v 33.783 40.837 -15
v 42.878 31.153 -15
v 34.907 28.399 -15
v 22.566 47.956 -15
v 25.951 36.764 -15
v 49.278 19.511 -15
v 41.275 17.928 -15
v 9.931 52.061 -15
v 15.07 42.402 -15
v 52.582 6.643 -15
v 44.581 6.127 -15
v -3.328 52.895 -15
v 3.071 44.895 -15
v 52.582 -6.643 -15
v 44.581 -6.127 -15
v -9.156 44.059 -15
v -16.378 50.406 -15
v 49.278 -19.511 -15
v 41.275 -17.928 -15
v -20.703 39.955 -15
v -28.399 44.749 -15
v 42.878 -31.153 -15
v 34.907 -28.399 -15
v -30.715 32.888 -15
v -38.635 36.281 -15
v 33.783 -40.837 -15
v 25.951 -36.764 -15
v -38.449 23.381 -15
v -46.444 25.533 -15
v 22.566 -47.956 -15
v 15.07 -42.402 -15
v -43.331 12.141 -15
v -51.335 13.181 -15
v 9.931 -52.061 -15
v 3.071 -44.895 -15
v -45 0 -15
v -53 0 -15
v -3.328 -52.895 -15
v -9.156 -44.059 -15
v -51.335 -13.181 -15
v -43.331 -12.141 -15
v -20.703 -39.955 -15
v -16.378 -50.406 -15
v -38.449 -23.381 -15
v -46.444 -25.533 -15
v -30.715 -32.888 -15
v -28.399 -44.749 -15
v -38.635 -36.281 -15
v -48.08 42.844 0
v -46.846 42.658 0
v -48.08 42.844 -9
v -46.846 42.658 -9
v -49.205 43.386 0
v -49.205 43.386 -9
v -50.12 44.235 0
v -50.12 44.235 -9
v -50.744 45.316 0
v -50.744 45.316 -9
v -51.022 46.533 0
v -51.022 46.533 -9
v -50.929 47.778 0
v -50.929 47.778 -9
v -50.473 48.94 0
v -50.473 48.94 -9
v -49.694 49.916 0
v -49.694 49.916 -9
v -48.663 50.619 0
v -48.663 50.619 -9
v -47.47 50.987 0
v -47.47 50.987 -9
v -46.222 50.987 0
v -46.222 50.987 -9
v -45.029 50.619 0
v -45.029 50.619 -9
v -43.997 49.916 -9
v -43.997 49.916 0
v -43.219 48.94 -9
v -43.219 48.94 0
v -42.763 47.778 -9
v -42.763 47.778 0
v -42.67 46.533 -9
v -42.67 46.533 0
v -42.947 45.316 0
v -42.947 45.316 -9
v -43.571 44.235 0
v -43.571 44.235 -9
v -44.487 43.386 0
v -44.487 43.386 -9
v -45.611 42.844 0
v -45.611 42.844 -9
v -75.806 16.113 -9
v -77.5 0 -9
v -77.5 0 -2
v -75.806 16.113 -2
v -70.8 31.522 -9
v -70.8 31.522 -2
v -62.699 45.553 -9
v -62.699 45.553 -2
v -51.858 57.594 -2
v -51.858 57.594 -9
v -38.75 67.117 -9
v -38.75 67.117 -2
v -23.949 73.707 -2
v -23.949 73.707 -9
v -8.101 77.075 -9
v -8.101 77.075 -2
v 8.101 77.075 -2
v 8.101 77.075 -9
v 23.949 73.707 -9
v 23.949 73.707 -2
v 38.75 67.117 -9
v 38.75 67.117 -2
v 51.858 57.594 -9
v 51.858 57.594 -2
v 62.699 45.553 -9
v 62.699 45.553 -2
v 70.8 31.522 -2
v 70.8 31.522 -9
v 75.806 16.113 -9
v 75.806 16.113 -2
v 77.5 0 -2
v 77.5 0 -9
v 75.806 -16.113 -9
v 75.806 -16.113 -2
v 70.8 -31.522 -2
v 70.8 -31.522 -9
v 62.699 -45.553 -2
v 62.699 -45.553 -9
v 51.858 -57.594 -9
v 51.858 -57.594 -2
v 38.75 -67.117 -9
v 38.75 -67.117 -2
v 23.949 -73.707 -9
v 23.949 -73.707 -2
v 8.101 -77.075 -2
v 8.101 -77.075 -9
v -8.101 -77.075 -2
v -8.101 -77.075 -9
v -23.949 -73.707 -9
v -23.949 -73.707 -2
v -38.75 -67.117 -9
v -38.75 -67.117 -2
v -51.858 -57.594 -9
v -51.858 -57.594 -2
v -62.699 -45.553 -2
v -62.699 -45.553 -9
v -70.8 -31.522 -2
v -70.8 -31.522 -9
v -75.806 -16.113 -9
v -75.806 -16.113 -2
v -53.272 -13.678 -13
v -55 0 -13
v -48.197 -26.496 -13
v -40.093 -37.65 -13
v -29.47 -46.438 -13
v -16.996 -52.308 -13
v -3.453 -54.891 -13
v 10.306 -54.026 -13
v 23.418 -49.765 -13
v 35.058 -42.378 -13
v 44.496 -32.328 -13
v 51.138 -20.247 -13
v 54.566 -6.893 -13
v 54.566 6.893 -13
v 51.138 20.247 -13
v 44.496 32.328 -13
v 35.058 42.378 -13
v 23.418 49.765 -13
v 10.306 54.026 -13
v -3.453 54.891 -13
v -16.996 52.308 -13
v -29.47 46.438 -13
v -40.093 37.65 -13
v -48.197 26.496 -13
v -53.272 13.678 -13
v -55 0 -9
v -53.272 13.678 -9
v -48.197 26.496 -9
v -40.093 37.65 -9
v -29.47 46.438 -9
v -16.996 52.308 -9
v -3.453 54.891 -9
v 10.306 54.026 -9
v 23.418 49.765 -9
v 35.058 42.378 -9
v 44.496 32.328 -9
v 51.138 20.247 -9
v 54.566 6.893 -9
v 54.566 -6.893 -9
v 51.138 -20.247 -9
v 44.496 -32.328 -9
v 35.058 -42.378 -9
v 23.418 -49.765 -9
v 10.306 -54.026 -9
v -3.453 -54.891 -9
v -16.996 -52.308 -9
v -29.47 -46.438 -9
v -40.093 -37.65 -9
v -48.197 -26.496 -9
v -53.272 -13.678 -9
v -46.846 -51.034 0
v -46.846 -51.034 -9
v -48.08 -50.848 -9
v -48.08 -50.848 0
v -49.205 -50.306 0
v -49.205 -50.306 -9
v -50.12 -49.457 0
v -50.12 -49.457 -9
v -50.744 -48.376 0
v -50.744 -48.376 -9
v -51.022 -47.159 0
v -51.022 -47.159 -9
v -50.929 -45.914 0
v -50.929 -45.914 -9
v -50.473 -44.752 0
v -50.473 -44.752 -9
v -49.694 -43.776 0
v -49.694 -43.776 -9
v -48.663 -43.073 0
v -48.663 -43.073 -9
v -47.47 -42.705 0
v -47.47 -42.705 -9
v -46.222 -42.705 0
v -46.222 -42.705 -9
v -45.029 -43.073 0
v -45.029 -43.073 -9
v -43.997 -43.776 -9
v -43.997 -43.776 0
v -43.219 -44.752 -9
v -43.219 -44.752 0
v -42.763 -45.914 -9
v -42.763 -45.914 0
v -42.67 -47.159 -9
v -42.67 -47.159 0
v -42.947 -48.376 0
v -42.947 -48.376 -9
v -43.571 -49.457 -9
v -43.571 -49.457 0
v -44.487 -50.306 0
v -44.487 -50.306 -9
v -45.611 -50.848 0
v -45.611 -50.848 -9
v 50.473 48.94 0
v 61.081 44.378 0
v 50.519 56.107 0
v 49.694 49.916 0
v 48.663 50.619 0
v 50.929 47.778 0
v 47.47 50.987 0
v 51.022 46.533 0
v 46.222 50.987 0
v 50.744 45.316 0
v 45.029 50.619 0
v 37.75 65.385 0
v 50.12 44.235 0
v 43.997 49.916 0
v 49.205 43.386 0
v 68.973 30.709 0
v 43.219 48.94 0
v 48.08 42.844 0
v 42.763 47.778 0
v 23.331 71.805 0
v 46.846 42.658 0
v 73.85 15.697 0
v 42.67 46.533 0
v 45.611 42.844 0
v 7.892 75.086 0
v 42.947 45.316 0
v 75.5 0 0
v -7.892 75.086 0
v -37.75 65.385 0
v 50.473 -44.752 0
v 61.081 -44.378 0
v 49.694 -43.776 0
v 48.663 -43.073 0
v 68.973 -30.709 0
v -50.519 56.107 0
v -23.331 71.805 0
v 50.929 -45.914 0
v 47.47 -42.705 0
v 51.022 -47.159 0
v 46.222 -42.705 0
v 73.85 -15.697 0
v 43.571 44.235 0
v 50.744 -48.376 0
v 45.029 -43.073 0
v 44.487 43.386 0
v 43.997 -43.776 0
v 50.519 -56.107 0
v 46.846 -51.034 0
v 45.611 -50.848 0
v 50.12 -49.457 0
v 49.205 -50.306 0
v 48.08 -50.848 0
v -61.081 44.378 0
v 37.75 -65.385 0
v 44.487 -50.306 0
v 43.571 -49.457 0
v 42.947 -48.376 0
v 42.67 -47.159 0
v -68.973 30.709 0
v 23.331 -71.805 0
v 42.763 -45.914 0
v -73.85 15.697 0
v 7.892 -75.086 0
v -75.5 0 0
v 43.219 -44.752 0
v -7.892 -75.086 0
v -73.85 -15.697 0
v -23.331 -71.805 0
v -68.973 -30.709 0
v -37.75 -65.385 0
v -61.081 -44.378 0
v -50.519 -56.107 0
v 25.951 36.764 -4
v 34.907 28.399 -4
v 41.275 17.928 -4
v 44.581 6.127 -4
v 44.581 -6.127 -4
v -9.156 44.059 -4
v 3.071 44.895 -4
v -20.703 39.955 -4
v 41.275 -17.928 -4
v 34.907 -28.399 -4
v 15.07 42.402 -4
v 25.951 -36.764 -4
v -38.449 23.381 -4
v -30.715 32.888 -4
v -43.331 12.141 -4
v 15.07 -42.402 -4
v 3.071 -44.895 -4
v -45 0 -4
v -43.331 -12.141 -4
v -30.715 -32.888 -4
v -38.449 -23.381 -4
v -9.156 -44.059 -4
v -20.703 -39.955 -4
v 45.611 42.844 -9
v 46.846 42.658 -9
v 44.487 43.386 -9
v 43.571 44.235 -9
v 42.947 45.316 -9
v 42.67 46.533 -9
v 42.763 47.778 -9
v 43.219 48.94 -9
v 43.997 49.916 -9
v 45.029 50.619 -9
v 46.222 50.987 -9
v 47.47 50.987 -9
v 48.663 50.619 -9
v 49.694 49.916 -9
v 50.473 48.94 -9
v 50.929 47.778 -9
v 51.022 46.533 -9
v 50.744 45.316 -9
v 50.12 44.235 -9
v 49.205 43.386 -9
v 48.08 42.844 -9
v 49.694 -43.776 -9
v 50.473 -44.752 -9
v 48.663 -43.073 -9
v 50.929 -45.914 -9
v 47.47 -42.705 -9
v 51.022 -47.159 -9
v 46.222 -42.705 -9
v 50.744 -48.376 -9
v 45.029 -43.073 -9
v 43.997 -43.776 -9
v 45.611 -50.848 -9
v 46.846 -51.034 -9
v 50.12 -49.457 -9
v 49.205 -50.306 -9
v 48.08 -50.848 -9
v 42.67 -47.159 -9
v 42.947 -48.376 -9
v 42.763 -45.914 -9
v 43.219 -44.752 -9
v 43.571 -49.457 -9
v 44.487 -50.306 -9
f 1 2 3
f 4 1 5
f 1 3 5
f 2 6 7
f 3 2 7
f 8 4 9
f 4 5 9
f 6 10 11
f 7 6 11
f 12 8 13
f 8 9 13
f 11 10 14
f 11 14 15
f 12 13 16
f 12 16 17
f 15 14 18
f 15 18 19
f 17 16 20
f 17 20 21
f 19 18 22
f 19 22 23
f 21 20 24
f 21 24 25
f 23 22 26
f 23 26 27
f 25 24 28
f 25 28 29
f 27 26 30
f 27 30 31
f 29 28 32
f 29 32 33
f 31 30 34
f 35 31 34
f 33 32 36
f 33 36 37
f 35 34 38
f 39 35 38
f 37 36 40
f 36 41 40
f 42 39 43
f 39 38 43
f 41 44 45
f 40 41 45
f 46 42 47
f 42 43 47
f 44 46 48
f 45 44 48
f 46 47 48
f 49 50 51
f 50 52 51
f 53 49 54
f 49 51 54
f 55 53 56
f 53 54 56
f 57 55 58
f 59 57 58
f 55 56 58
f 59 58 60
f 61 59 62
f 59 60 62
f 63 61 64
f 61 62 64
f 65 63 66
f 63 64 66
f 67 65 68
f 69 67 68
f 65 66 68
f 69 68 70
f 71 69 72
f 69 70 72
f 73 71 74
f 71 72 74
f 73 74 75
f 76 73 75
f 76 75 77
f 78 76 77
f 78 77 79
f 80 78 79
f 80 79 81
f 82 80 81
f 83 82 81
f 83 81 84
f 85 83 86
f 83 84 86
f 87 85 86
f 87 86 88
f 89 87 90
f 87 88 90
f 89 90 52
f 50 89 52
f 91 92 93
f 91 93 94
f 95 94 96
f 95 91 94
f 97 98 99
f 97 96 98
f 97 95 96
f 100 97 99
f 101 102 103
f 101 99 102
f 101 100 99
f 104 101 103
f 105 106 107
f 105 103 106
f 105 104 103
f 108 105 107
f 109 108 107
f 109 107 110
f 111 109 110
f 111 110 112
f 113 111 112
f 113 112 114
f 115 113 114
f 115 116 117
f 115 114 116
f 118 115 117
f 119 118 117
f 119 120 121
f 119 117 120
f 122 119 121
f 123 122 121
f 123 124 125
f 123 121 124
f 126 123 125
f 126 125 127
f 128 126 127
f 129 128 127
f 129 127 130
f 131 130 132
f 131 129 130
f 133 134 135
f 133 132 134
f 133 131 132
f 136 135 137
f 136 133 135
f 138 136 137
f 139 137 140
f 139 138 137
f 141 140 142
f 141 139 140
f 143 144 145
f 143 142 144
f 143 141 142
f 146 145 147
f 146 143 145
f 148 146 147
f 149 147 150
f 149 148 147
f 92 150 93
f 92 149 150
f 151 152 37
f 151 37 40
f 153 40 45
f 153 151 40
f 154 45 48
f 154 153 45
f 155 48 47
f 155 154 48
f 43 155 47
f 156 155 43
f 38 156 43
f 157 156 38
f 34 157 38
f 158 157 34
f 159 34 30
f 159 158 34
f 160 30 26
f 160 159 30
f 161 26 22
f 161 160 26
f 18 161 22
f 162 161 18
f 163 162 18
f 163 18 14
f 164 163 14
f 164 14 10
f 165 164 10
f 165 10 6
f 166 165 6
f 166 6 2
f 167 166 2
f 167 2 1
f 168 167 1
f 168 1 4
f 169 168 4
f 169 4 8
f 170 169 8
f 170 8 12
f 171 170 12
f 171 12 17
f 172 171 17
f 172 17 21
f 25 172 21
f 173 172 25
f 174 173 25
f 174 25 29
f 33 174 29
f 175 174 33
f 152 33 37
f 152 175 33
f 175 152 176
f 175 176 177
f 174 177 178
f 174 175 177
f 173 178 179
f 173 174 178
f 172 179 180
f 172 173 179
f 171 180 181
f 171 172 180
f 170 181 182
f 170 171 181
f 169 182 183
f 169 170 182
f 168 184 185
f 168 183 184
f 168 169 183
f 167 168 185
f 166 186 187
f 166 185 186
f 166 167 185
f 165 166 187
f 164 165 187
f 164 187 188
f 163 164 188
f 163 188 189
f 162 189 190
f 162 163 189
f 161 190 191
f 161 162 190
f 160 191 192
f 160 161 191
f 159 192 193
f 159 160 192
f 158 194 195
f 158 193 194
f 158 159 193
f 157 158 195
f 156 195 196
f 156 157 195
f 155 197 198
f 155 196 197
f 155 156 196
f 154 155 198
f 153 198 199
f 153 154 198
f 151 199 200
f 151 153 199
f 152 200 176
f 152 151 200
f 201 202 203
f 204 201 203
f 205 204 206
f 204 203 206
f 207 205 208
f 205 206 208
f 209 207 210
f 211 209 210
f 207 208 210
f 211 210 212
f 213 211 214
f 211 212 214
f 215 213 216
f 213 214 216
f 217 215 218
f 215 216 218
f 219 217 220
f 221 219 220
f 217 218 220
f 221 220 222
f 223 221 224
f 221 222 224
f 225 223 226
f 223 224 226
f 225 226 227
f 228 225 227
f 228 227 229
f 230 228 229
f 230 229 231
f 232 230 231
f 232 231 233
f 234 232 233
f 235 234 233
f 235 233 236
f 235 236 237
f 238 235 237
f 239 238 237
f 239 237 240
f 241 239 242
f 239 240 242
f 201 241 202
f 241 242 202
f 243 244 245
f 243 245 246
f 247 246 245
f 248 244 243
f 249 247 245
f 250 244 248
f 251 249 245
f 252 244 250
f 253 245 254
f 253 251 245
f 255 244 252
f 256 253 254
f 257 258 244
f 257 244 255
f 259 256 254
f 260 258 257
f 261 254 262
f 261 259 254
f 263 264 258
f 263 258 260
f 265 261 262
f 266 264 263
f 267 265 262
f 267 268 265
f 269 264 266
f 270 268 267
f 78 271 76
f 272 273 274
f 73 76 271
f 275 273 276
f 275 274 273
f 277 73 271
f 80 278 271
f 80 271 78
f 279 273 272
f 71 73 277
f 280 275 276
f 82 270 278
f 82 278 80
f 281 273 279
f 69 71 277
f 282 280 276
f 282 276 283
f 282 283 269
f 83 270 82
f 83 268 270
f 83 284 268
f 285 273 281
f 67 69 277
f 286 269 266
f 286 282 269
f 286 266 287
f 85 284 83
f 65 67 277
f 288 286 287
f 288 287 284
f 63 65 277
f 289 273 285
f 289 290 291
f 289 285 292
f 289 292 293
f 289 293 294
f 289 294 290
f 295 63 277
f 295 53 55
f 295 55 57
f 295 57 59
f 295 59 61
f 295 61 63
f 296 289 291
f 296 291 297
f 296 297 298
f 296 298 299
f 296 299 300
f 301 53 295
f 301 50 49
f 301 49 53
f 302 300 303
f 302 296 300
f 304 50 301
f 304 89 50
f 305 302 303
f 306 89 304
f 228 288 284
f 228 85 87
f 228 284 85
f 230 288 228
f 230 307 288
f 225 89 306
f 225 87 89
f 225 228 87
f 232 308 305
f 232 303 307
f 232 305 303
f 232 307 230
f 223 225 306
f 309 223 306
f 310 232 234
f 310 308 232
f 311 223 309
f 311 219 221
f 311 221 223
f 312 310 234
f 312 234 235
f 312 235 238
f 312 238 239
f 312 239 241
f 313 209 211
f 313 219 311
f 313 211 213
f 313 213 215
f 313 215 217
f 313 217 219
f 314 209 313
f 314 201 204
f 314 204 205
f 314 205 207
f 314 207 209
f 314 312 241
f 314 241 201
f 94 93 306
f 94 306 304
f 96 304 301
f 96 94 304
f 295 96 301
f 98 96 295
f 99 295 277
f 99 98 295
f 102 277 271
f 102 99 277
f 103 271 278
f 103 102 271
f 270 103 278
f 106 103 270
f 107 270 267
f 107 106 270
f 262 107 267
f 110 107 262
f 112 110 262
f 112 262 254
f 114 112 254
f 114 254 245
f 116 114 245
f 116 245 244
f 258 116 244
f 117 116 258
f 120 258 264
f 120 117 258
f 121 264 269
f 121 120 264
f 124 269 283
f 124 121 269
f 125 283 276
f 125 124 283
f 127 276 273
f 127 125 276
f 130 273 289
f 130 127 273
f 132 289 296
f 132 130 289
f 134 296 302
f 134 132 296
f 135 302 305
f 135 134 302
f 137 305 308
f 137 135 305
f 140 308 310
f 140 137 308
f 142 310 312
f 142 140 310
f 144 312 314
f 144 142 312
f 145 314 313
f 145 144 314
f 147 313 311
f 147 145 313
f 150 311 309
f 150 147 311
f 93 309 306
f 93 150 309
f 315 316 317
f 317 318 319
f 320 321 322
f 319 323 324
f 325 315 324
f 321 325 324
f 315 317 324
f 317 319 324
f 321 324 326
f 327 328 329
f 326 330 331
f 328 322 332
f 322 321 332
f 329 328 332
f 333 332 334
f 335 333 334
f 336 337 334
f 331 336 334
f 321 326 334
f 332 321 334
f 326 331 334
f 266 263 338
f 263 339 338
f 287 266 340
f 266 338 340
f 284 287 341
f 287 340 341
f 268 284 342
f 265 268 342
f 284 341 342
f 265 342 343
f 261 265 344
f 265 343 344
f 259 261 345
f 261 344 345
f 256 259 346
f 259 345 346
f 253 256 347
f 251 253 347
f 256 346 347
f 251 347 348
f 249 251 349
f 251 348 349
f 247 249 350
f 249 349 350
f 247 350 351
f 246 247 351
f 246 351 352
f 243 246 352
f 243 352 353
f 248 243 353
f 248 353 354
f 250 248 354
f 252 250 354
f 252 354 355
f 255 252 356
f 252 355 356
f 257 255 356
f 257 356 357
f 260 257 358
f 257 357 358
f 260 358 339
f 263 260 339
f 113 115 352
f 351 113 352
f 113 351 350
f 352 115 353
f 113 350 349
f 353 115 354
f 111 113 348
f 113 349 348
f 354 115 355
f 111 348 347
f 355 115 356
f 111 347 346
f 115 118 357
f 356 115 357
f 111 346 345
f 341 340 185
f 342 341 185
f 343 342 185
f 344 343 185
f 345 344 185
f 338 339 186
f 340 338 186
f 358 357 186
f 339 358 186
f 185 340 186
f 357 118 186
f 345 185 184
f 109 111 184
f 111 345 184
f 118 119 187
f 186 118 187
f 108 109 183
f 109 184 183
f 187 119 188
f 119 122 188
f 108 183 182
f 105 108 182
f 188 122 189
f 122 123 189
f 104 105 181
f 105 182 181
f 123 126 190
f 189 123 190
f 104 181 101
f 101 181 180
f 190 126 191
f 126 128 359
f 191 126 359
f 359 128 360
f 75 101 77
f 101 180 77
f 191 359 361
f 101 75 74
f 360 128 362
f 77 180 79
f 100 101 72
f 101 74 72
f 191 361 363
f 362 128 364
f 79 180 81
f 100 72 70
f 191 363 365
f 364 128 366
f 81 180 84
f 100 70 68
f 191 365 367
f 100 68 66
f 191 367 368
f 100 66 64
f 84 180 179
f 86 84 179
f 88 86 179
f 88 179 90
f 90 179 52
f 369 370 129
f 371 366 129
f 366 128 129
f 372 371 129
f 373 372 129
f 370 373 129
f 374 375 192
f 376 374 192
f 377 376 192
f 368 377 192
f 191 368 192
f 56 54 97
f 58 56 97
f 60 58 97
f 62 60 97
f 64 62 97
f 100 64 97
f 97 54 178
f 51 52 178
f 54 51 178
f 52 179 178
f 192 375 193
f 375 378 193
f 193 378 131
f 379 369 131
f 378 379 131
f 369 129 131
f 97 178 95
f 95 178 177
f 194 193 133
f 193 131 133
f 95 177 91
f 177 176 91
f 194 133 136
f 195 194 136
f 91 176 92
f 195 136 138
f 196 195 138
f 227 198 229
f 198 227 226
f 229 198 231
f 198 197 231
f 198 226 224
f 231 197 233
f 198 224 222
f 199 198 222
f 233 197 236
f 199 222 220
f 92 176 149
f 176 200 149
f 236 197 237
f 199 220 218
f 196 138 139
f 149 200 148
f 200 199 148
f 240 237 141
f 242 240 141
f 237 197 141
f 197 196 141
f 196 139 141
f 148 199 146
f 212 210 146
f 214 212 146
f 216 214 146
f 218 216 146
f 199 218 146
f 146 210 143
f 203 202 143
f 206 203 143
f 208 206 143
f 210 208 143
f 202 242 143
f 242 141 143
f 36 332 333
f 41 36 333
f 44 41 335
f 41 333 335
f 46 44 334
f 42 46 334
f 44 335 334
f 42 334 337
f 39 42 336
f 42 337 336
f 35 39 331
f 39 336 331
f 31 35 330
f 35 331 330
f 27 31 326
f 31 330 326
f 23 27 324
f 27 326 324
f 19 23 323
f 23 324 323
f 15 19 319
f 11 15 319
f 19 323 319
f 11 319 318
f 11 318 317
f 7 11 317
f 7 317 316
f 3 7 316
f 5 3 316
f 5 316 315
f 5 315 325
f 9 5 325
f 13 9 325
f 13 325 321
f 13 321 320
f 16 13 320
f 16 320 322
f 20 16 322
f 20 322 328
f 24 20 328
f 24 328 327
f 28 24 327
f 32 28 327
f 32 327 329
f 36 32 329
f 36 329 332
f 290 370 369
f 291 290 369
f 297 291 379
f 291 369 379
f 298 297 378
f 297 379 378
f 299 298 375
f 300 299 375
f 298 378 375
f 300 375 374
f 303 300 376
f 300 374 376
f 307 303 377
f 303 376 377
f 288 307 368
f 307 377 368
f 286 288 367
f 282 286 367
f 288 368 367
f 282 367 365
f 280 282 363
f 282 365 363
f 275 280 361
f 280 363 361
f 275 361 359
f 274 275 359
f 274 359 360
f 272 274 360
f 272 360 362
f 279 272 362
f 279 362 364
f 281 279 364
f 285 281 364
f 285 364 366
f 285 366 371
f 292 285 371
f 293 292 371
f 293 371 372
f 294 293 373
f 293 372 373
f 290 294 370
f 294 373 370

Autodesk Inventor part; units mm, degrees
ref_plane "YZ Plane" through (0, 0, 0) normal (1, 0, 0) x (0, 1, 0)
ref_plane "XZ Plane" through (0, 0, 0) normal (0, 1, 0) x (-1, 0, 0)
ref_plane "XY Plane" through (0, 0, 0) normal (0, 0, 1) x (1, 0, 0)
sketch "Эскиз1" plane through (0, 0, 0) normal (0, 1, 0) x (-1, 0, 0)
  line L0 (0, 0) -> (77.5, 0)
  line L1 (77.5, 0) -> (77.5, -9)
  line L2 (77.5, -9) -> (55, -9)
  line L3 (55, -9) -> (55, -15)
  line L4 (0, -4) -> (0, 0)
  line L5 (55, -15) -> (45, -15)
  line L6 (45, -15) -> (45, -4)
  line L7 (45, -4) -> (0, -4)
  dimension "d0" = 155
  dimension "d1" = 110
  dimension "d3" = 9
  dimension "d5" = 15
  dimension "d6" = 90
  dimension "d7" = 4
revolve "Вращение1" add sketch "Эскиз1" angle 360 about axis through (0, 0, -4) along (0, 0, 1)
sketch "Эскиз3" plane through (0, 0, 0) normal (0, 0, 1) x (1, 0, 0)
  circle A0 centre (0, 0) radius 66.25 construction
  line L0 (0, 0) -> (-70.023, -70.023) construction
  line L1 (0, 0) -> (99.0274, 0) construction
  point P0 (0, 0)
  point P1 (-46.8458, -46.8458)
  point P2 (46.8458, -46.8458)
  point P3 (46.8458, 46.8458)
  point P4 (-46.8458, 46.8458)
  dimension "d15" = 132.5
  dimension "d16" = 135
  dimension "d19" = 360
hole "Отверстие1" at (-46.8458, -46.8458, 0) at (46.8458, -46.8458, 0) at (46.8458, 46.8458, 0) at (-46.8458, 46.8458, 0) direction (0, 0, -1) diameter 8.376 end through all thread size "M10x1.5" class "6H" standard "ISO Metric profile"
chamfer "Фаска1" distance 2 angle 45 2 edges at (55, 0, -15) (77.5, 0, 0)
properties part number "МПСТ Крышка подшипника глухая 110" material "Сталь, углеродистая"
